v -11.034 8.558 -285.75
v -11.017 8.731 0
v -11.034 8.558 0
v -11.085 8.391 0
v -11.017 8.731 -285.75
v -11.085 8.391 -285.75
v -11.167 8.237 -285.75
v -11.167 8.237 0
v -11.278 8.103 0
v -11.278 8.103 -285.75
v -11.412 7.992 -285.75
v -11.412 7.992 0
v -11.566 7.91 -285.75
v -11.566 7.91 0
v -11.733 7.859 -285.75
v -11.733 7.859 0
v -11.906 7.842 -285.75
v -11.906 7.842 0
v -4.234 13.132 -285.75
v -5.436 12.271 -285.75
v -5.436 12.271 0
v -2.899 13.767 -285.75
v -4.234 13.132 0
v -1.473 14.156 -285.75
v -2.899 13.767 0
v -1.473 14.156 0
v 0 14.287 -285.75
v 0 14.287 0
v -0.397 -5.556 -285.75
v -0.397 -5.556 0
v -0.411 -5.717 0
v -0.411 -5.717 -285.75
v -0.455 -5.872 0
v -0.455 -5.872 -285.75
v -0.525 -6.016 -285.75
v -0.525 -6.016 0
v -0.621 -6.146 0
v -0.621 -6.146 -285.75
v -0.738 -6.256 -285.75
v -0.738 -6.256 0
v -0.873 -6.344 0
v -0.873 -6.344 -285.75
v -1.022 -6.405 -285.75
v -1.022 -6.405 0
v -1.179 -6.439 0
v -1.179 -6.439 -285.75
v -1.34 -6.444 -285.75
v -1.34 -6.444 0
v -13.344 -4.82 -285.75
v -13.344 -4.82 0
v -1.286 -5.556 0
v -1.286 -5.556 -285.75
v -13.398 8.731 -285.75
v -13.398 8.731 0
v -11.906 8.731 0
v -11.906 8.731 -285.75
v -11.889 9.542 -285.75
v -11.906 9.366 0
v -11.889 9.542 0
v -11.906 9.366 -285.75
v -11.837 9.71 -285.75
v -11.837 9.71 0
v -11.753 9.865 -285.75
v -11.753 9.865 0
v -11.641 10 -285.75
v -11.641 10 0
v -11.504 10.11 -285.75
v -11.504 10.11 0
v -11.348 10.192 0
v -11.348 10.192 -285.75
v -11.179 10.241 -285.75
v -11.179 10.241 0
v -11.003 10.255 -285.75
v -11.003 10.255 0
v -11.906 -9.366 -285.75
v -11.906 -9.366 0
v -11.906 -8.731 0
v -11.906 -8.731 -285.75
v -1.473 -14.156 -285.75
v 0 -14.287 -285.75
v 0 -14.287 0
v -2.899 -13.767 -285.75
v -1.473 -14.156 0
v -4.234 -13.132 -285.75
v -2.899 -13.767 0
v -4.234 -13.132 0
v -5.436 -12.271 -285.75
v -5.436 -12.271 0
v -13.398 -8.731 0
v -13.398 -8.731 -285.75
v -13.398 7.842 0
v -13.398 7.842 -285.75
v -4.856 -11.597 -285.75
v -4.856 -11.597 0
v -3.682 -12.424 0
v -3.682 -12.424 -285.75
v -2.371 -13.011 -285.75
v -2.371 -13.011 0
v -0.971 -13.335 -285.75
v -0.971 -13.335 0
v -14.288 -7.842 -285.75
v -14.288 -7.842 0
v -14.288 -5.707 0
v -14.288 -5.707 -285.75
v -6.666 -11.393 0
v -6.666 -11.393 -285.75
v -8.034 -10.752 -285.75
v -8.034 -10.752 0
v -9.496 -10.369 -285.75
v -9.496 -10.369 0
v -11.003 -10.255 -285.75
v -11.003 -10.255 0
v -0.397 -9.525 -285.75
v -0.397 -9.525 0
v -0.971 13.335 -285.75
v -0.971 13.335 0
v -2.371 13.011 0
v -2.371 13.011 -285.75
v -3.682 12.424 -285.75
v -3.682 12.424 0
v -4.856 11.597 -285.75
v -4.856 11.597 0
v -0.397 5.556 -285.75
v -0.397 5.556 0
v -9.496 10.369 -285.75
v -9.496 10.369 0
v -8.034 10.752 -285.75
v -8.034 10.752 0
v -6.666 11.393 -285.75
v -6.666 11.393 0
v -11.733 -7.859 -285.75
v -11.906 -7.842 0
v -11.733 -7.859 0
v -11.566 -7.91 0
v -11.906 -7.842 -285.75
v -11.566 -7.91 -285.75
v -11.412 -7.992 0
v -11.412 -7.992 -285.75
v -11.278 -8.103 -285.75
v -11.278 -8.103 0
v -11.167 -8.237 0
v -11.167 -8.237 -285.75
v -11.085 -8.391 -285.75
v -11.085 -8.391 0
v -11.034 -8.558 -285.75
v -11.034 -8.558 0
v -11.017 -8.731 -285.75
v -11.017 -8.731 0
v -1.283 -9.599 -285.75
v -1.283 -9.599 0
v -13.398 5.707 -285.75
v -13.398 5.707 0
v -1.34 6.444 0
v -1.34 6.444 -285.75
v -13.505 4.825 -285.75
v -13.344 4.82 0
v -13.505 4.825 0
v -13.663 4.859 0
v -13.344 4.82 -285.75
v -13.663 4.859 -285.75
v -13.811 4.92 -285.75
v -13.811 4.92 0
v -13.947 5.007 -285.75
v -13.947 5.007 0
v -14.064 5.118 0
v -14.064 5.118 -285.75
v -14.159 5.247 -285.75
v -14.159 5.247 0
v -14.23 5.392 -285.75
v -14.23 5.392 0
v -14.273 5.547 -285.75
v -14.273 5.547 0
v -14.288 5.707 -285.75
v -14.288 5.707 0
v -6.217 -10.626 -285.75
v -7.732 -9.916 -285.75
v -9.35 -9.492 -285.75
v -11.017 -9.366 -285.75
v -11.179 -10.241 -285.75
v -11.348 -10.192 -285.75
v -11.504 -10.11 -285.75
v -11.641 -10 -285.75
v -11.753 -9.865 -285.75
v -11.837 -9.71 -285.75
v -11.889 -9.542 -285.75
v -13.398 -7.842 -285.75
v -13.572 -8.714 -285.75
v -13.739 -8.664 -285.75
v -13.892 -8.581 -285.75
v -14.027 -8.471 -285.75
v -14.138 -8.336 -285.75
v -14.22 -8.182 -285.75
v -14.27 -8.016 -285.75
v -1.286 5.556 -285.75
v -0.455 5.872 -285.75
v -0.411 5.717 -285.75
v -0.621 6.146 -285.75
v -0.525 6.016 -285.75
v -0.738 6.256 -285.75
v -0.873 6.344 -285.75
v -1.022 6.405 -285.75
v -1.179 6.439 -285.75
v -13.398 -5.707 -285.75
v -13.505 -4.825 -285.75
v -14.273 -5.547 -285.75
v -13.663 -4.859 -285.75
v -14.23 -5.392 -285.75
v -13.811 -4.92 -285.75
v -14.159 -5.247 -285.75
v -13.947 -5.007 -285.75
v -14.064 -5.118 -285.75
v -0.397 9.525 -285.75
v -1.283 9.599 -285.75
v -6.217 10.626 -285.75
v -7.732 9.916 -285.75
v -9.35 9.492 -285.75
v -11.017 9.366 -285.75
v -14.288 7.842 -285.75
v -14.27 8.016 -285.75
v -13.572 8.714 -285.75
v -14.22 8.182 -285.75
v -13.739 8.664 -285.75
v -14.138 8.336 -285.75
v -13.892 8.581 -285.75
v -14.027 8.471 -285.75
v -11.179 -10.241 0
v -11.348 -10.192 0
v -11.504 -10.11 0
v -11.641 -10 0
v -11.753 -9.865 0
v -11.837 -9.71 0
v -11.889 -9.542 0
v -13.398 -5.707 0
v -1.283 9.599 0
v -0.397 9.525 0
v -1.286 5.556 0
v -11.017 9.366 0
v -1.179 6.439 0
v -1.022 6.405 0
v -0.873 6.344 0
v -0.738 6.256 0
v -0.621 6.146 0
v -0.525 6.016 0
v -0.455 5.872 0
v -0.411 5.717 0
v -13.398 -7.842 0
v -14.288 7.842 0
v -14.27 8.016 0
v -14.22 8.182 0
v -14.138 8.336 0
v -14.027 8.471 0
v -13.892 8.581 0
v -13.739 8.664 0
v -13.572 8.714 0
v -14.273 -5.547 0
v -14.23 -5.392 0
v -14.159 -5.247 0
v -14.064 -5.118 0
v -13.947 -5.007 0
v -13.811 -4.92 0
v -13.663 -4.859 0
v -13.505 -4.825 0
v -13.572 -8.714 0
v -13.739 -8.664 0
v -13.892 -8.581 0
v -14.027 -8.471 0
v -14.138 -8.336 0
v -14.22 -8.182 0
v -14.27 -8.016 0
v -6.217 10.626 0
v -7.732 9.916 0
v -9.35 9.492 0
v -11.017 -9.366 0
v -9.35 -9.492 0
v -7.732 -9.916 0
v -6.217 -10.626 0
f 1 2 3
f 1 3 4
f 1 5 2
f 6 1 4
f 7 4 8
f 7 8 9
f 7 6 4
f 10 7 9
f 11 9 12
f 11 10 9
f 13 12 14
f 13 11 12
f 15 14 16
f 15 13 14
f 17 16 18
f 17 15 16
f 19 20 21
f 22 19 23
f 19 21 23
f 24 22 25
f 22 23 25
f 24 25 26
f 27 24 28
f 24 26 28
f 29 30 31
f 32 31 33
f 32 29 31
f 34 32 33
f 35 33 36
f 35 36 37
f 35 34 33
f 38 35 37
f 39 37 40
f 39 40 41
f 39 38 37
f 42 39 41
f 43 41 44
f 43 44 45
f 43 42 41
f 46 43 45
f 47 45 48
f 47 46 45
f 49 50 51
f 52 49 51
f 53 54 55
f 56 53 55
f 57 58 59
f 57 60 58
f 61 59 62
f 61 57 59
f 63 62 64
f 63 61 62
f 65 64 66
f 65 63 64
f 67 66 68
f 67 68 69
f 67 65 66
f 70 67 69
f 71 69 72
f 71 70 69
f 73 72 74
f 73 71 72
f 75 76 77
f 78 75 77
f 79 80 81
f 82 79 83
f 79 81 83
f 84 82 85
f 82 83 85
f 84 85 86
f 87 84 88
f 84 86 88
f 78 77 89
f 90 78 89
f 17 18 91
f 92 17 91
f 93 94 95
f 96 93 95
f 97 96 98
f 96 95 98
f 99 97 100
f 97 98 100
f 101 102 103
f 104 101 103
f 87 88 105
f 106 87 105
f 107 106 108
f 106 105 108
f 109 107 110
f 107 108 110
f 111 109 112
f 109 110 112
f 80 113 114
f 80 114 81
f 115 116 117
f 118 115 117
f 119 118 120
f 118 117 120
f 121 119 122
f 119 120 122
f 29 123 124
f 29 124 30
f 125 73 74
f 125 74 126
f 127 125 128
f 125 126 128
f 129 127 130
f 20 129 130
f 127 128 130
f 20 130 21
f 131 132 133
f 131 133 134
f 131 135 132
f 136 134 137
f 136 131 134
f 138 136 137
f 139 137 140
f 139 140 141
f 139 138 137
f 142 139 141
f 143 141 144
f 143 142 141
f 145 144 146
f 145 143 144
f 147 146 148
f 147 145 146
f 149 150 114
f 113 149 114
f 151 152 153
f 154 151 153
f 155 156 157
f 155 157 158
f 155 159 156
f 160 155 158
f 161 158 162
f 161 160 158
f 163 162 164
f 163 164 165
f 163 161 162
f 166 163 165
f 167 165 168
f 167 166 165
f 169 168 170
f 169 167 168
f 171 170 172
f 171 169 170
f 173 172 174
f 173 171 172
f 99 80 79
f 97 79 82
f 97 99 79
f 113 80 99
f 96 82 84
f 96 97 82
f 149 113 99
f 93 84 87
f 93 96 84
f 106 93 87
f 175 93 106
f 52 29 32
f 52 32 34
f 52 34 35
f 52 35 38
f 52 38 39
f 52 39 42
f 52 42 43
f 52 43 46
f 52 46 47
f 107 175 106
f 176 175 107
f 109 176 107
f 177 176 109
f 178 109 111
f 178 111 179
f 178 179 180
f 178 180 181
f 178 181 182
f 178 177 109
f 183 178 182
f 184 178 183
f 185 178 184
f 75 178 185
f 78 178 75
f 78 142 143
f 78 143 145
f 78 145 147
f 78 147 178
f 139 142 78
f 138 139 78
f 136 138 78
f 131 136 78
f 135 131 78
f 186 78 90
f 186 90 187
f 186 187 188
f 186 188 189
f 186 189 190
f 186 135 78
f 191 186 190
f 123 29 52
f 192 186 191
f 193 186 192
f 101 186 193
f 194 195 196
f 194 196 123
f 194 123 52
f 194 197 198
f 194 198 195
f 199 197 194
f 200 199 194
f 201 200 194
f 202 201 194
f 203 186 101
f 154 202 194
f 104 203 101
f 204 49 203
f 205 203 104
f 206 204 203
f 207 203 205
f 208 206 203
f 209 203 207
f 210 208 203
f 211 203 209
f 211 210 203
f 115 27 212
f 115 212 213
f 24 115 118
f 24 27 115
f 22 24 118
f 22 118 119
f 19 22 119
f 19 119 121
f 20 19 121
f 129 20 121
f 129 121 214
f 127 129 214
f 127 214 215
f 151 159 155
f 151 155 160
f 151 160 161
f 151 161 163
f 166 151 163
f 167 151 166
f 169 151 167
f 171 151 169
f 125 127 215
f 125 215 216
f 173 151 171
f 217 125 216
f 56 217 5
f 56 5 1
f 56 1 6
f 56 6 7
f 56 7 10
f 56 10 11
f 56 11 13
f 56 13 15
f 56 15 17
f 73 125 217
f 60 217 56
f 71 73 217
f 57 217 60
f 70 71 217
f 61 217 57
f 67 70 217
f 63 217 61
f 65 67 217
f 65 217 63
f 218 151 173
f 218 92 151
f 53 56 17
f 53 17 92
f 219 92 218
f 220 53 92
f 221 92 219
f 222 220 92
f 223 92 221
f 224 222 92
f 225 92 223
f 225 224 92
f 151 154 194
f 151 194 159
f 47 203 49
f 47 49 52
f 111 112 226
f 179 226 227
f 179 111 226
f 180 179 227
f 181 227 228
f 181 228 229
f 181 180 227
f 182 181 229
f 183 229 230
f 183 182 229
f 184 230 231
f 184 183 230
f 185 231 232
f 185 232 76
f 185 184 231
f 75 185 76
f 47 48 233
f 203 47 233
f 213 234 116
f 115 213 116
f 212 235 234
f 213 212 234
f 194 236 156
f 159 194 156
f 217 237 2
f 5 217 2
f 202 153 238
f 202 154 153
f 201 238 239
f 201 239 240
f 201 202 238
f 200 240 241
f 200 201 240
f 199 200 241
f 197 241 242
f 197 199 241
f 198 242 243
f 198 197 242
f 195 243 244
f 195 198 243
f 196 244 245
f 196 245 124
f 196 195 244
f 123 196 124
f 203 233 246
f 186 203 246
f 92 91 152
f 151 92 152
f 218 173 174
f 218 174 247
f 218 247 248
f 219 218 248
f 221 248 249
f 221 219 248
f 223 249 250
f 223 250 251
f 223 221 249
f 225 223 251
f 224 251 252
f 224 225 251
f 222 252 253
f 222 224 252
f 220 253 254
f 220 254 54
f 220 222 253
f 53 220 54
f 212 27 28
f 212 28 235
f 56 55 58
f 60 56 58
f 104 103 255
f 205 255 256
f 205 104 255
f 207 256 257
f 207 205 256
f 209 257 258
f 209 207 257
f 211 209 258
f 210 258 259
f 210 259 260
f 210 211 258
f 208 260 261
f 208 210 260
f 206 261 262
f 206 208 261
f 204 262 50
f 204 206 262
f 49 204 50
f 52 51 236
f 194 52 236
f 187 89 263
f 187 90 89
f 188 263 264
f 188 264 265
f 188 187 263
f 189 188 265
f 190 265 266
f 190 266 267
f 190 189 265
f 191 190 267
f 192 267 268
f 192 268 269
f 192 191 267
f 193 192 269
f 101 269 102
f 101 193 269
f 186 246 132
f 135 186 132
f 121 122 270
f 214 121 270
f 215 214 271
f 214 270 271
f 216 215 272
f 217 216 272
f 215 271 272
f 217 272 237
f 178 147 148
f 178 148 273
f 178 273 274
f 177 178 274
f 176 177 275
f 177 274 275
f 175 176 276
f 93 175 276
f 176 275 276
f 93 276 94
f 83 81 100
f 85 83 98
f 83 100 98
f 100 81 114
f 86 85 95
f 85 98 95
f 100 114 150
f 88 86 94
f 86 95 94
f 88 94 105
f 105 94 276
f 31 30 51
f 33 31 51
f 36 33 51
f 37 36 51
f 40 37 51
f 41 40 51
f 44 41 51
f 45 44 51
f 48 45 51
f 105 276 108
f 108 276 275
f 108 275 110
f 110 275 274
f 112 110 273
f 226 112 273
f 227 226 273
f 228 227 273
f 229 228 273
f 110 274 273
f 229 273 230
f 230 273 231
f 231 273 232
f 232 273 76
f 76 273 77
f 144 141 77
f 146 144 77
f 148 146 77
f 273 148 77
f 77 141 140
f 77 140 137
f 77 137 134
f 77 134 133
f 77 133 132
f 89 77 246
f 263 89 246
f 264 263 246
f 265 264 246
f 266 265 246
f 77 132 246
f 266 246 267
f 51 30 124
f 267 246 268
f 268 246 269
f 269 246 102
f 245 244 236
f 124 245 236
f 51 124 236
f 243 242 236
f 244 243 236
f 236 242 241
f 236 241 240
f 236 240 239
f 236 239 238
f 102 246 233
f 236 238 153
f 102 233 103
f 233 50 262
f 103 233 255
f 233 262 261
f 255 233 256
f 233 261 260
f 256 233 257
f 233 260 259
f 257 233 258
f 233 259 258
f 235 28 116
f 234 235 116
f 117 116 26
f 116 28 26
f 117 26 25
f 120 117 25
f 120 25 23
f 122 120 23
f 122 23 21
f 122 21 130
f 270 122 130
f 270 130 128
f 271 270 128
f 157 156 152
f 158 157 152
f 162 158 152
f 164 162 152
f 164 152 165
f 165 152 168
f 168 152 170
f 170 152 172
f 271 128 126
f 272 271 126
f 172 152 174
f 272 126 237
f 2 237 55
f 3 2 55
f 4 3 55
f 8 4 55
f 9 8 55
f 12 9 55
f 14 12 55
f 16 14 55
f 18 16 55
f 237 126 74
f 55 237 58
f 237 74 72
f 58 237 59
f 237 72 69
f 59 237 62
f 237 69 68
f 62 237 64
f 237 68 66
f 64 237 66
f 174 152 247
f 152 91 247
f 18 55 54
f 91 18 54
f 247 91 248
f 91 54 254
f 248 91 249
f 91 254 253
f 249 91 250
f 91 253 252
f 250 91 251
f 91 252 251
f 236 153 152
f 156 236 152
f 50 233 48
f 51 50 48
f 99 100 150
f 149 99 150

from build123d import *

# Parameters (mm, degrees)
EXTRUDE_THIN1_DEPTH = 285.75
FILLET1_R           = 0.889


with BuildPart() as part:
    # Sketch1 → Extrude-Thin1 (new body)
    with BuildSketch(Plane.XY):
        with BuildLine():
            Line((-0.396875, -9.525), (0, -14.2875))
            ThreePointArc((0, -14.2875), (-2.898897336, -13.767099717), (-5.435779046, -12.270886692))
            ThreePointArc((-5.435779046, -12.270886692), (-8.464256404, -10.6095065), (-11.90625, -10.31875))
            Line((-11.90625, -10.31875), (-11.90625, -8.73125))
            Line((-11.90625, -8.73125), (-14.2875, -8.73125))
            Line((-14.2875, -8.73125), (-14.2875, -4.7625))
            Line((-14.2875, -4.7625), (-1.285875, -5.55625))
            Line((-1.285875, -5.55625), (-1.285875, 5.55625))
            Line((-1.285875, 5.55625), (-14.2875, 4.7625))
            Line((-14.2875, 4.7625), (-14.2875, 8.73125))
            Line((-14.2875, 8.73125), (-11.90625, 8.73125))
            Line((-11.90625, 8.73125), (-11.90625, 10.31875))
            ThreePointArc((-11.90625, 10.31875), (-8.464256404, 10.6095065), (-5.435779046, 12.270886692))
            ThreePointArc((-5.435779046, 12.270886692), (-2.898897336, 13.767099717), (0, 14.2875))
            Line((0, 14.2875), (-0.396875, 9.525))
            Line((-0.396875, 9.525), (-1.282804179, 9.598827432))
            Line((-1.282804179, 9.598827432), (-0.971469005, 13.334849518))
            ThreePointArc((-0.971469005, 13.334849518), (-3.040522473, 12.749361604), (-4.855962615, 11.596992112))
            ThreePointArc((-4.855962615, 11.596992112), (-7.731844672, 9.916114382), (-11.01725, 9.366424127))
            Line((-11.01725, 9.366424127), (-11.01725, 7.84225))
            Line((-11.01725, 7.84225), (-13.3985, 7.84225))
            Line((-13.3985, 7.84225), (-13.3985, 5.707428664))
            Line((-13.3985, 5.707428664), (-0.396875, 6.501178664))
            Line((-0.396875, 6.501178664), (-0.396875, -6.501178664))
            Line((-0.396875, -6.501178664), (-13.3985, -5.707428664))
            Line((-13.3985, -5.707428664), (-13.3985, -7.84225))
            Line((-13.3985, -7.84225), (-11.01725, -7.84225))
            Line((-11.01725, -7.84225), (-11.01725, -9.366424127))
            ThreePointArc((-11.01725, -9.366424127), (-7.731844672, -9.916114382), (-4.855962615, -11.596992112))
            ThreePointArc((-4.855962615, -11.596992112), (-3.040522473, -12.749361604), (-0.971469005, -13.334849518))
            Line((-0.971469005, -13.334849518), (-1.282804179, -9.598827432))
            Line((-1.282804179, -9.598827432), (-0.396875, -9.525))
        make_face()
    extrude(amount=-EXTRUDE_THIN1_DEPTH)

    # Fillet1
    fillet1_edges = [part.edges().sort_by_distance(p)[0] for p in [
        (-11.90625, -10.31875, -142.875),
        (-14.2875, -8.73125, -142.875),
        (-14.2875, -4.7625, -142.875),
        (-14.2875, 4.7625, -142.875),
        (-14.2875, 8.73125, -142.875),
        (-11.90625, 10.31875, -142.875),
        (-11.01725, 7.84225, -142.875),
        (-0.396875, 6.501178664, -142.875),
        (-0.396875, -6.501178664, -142.875),
        (-11.01725, -7.84225, -142.875),
    ]]
    fillet(fillet1_edges, radius=FILLET1_R)


solid = part.part
